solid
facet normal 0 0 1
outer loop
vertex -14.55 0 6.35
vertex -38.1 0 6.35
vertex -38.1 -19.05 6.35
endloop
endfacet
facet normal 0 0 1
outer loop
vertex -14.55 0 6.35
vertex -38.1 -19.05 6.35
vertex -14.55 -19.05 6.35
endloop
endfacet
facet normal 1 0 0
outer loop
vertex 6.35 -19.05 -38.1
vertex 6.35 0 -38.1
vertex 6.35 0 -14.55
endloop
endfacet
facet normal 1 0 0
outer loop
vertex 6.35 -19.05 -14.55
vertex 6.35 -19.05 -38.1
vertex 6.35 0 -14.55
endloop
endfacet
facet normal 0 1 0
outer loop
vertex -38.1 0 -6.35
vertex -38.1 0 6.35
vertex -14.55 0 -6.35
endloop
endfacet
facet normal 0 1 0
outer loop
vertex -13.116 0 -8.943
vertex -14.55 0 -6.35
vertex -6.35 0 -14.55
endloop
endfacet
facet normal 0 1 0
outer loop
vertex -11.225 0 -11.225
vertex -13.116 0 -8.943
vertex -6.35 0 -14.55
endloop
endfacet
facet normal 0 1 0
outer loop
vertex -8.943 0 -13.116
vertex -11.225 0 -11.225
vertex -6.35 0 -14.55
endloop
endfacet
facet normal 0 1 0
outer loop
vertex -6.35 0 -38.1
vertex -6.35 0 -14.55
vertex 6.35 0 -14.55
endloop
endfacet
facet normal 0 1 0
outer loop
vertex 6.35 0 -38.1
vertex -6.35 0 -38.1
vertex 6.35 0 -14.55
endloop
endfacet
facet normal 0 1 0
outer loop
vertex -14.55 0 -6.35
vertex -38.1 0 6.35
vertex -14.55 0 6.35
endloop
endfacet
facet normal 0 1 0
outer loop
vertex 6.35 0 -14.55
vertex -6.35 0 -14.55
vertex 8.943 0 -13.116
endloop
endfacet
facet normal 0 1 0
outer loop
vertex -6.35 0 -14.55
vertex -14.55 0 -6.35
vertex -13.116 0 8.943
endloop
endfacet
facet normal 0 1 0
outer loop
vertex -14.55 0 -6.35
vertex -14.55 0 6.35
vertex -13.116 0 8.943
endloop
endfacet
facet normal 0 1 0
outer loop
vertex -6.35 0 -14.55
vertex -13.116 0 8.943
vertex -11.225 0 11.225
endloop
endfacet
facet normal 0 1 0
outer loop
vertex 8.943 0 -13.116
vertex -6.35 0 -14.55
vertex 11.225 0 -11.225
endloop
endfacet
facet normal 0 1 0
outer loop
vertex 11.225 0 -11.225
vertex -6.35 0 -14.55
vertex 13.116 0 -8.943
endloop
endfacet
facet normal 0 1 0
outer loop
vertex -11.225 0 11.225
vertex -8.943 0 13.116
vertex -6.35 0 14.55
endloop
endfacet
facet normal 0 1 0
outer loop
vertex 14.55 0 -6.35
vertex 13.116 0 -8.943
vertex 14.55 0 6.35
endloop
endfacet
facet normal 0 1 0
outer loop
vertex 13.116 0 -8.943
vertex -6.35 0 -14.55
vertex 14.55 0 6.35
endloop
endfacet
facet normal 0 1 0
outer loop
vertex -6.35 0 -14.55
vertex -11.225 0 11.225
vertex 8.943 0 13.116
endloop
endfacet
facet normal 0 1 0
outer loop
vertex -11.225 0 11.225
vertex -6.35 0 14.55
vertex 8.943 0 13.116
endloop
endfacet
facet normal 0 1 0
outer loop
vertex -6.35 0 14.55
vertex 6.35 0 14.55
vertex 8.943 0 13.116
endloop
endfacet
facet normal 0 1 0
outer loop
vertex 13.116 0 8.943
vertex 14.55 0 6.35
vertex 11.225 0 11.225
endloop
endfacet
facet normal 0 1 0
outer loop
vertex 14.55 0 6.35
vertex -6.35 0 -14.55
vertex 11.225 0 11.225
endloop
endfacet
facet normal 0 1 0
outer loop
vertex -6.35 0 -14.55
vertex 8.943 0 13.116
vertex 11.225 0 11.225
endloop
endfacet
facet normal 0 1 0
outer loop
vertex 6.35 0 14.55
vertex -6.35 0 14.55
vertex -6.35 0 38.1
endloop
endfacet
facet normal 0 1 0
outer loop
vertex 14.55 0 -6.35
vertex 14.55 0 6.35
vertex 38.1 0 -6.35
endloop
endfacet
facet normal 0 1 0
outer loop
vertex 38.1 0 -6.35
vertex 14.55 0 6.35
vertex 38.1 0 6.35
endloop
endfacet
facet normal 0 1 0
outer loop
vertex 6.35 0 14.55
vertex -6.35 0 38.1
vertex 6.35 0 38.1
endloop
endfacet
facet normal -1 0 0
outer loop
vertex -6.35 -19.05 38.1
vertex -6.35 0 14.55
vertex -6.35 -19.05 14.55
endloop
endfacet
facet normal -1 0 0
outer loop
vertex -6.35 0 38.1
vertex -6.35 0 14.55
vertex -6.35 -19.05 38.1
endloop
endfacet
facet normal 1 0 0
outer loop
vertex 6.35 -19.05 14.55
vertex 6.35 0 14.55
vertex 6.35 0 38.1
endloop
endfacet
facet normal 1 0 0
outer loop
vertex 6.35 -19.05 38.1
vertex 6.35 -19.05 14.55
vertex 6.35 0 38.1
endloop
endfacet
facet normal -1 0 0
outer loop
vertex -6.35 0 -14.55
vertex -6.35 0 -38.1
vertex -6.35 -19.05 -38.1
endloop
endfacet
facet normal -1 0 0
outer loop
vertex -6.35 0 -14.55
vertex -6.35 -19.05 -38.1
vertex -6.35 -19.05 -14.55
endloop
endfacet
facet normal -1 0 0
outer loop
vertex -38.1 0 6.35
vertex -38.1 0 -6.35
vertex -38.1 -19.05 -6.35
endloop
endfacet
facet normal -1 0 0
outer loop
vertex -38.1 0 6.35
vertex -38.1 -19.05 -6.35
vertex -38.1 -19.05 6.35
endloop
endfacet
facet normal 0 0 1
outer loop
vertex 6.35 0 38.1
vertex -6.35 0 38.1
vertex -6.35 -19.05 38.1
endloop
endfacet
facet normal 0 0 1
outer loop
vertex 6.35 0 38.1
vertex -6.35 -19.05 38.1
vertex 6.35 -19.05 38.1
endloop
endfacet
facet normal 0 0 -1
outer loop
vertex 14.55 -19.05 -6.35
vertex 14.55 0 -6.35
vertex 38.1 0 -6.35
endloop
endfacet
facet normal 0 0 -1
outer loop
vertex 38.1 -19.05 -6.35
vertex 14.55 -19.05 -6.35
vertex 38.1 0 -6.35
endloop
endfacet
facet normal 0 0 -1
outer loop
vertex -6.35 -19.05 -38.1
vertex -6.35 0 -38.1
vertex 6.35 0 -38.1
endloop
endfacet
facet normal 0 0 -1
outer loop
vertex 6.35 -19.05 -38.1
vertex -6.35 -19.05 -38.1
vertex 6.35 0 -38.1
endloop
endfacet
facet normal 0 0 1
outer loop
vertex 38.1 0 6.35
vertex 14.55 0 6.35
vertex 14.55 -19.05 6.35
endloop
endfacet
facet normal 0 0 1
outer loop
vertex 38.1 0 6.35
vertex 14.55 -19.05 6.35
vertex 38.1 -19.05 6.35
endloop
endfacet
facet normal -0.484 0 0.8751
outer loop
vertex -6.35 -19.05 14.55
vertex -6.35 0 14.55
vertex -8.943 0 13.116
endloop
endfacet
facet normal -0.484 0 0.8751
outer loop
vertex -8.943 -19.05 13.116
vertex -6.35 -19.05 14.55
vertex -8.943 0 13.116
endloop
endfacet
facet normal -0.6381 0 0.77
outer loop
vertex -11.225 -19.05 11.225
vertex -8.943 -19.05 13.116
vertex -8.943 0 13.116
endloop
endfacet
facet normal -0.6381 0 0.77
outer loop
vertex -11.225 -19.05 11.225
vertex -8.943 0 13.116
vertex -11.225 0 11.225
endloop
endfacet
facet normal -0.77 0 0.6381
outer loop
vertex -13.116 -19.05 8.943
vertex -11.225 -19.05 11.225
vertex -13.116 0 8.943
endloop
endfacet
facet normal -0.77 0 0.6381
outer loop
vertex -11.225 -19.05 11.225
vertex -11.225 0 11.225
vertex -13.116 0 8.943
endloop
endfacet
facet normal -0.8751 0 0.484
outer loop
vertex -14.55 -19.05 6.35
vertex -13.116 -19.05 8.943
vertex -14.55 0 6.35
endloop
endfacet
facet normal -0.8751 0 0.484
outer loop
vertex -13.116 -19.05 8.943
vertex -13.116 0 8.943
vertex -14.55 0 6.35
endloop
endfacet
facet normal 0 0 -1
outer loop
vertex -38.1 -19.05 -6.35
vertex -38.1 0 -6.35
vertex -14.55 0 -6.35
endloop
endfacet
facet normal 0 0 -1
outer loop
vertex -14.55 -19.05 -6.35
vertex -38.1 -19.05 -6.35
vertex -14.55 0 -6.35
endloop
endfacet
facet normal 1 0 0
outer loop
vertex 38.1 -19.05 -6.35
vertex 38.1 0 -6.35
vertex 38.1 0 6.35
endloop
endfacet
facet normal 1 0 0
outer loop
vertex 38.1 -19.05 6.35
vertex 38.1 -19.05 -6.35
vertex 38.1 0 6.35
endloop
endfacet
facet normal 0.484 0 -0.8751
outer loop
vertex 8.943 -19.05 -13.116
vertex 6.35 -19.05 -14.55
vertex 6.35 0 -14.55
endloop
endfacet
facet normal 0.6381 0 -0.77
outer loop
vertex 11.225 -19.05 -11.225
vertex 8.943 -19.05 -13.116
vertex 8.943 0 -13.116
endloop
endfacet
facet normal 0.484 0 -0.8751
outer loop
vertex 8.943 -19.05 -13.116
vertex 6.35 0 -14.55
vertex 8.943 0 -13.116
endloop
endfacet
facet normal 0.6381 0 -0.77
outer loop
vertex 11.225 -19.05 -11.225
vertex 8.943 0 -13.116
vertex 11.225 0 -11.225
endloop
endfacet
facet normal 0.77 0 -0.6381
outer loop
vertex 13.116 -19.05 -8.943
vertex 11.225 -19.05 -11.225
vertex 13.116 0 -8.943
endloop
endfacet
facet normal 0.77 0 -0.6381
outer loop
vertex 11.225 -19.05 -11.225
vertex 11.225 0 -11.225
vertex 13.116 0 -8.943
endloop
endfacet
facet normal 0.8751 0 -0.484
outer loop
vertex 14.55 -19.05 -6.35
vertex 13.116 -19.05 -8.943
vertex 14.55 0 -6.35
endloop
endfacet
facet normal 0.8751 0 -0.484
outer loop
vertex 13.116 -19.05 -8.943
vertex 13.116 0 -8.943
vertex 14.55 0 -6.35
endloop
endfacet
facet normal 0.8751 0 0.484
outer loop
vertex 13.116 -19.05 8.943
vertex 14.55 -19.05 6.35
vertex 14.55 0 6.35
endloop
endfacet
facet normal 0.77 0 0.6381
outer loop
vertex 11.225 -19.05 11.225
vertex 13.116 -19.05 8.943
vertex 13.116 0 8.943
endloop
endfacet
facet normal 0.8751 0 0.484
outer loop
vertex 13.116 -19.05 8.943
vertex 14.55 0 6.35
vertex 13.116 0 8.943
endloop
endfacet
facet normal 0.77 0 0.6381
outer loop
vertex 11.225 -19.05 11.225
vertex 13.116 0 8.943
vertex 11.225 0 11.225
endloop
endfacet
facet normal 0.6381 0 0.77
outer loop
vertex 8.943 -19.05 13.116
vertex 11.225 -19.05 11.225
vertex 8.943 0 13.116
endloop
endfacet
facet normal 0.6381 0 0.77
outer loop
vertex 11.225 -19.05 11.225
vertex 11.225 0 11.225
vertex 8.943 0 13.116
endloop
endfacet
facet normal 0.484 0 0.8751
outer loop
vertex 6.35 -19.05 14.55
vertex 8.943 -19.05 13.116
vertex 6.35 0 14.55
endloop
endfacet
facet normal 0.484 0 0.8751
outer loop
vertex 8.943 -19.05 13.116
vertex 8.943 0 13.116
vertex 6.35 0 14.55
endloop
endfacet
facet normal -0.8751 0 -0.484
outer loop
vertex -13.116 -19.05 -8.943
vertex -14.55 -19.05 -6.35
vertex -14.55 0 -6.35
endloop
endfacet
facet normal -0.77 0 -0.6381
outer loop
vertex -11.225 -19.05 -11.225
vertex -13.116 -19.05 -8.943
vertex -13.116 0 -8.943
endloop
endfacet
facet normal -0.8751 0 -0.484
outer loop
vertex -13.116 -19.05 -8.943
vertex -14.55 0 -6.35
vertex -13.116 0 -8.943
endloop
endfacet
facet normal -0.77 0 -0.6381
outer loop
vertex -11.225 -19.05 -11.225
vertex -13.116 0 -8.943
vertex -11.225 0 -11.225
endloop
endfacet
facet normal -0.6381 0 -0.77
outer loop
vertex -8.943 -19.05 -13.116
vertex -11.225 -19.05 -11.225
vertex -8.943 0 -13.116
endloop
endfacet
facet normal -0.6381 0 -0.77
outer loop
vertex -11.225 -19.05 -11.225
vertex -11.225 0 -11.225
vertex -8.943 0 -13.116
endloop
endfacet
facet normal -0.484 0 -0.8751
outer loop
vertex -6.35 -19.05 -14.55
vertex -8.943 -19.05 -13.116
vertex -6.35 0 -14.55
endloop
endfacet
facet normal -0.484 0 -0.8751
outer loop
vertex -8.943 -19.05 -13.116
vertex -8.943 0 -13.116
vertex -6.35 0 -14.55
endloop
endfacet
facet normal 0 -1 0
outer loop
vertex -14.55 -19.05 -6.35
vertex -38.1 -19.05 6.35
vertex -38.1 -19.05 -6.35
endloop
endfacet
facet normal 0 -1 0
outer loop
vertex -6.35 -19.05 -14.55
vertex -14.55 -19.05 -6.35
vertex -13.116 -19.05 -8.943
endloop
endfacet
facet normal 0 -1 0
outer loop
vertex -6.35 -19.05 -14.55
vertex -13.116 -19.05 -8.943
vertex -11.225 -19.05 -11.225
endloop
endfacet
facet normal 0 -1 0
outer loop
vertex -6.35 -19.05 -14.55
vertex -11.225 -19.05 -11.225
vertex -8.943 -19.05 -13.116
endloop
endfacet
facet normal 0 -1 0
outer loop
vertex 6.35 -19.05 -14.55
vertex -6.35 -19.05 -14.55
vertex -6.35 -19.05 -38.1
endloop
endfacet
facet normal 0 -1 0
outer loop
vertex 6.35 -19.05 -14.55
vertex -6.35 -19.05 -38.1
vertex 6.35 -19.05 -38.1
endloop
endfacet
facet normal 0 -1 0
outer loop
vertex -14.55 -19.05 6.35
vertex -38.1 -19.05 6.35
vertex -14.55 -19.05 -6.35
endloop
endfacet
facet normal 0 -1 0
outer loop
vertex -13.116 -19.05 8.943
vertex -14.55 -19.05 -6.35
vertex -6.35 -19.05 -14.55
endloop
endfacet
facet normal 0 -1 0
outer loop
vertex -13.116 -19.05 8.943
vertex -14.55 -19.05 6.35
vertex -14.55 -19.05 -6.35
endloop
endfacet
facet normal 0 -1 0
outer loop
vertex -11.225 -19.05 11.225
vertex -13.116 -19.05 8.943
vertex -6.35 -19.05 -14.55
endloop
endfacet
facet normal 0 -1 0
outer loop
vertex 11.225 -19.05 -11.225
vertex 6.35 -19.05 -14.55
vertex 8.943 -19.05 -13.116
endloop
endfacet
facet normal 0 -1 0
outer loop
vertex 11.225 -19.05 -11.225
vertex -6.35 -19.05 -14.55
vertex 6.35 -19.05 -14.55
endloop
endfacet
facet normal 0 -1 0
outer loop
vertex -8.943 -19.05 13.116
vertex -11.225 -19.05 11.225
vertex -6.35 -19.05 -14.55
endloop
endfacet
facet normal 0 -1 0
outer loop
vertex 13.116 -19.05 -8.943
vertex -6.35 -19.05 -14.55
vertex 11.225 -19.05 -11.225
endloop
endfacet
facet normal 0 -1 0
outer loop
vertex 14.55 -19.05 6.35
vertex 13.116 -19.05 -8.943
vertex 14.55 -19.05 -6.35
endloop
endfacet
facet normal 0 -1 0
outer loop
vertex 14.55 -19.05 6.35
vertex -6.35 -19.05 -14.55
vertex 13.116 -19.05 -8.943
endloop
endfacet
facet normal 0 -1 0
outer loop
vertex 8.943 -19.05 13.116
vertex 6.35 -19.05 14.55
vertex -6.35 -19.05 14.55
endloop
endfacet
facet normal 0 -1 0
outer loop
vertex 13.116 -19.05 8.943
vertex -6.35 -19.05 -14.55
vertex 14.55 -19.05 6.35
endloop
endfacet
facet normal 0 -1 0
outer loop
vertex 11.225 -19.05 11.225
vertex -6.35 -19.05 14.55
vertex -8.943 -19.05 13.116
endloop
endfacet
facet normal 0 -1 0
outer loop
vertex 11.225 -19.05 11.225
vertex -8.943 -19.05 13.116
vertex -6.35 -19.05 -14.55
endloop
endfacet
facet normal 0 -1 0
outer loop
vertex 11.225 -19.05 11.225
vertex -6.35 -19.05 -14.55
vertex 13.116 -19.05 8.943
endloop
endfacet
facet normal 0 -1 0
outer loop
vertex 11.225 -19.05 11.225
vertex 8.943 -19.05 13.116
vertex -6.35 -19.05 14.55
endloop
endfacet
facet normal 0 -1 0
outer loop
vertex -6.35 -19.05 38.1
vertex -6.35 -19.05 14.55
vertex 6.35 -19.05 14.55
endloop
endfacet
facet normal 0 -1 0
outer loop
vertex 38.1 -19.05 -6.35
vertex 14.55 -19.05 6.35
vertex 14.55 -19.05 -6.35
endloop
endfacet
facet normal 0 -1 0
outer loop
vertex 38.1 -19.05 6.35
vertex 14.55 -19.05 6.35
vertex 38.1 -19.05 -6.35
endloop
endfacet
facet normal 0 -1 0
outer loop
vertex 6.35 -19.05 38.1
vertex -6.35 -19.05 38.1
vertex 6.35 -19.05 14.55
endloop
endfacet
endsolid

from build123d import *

# Parameters (mm, degrees)
F0_W     = 76.2
F0_H     = 76.2
F2_DEPTH = 19.05
F1_W     = 31.75
F1_H     = 31.75
F3_DEPTH = 19.051
F4_R     = 15.875
F5_DEPTH = 19.05


with BuildPart() as f2:
    # F0 (on Front) → F2 (new body)
    with BuildSketch(Plane.XZ):
        Rectangle(F0_W, F0_H)
    extrude(amount=F2_DEPTH)

    # F1 (on Front) → F3 (cut, through all)
    with BuildSketch(Plane.XZ):
        with Locations((-22.225, 22.225)):
            Rectangle(F1_W, F1_H)
        with Locations((-22.225, -22.225)):
            Rectangle(F1_W, F1_H)
        with Locations((22.225, -22.225)):
            Rectangle(F1_W, F1_H)
        with Locations((22.225, 22.225)):
            Rectangle(F1_W, F1_H)
    extrude(amount=F3_DEPTH, mode=Mode.SUBTRACT)

    # F4 (on Front) → F5 (join)
    with BuildSketch(Plane.XZ):
        Circle(F4_R)
    extrude(amount=F5_DEPTH)


solid = f2.part
